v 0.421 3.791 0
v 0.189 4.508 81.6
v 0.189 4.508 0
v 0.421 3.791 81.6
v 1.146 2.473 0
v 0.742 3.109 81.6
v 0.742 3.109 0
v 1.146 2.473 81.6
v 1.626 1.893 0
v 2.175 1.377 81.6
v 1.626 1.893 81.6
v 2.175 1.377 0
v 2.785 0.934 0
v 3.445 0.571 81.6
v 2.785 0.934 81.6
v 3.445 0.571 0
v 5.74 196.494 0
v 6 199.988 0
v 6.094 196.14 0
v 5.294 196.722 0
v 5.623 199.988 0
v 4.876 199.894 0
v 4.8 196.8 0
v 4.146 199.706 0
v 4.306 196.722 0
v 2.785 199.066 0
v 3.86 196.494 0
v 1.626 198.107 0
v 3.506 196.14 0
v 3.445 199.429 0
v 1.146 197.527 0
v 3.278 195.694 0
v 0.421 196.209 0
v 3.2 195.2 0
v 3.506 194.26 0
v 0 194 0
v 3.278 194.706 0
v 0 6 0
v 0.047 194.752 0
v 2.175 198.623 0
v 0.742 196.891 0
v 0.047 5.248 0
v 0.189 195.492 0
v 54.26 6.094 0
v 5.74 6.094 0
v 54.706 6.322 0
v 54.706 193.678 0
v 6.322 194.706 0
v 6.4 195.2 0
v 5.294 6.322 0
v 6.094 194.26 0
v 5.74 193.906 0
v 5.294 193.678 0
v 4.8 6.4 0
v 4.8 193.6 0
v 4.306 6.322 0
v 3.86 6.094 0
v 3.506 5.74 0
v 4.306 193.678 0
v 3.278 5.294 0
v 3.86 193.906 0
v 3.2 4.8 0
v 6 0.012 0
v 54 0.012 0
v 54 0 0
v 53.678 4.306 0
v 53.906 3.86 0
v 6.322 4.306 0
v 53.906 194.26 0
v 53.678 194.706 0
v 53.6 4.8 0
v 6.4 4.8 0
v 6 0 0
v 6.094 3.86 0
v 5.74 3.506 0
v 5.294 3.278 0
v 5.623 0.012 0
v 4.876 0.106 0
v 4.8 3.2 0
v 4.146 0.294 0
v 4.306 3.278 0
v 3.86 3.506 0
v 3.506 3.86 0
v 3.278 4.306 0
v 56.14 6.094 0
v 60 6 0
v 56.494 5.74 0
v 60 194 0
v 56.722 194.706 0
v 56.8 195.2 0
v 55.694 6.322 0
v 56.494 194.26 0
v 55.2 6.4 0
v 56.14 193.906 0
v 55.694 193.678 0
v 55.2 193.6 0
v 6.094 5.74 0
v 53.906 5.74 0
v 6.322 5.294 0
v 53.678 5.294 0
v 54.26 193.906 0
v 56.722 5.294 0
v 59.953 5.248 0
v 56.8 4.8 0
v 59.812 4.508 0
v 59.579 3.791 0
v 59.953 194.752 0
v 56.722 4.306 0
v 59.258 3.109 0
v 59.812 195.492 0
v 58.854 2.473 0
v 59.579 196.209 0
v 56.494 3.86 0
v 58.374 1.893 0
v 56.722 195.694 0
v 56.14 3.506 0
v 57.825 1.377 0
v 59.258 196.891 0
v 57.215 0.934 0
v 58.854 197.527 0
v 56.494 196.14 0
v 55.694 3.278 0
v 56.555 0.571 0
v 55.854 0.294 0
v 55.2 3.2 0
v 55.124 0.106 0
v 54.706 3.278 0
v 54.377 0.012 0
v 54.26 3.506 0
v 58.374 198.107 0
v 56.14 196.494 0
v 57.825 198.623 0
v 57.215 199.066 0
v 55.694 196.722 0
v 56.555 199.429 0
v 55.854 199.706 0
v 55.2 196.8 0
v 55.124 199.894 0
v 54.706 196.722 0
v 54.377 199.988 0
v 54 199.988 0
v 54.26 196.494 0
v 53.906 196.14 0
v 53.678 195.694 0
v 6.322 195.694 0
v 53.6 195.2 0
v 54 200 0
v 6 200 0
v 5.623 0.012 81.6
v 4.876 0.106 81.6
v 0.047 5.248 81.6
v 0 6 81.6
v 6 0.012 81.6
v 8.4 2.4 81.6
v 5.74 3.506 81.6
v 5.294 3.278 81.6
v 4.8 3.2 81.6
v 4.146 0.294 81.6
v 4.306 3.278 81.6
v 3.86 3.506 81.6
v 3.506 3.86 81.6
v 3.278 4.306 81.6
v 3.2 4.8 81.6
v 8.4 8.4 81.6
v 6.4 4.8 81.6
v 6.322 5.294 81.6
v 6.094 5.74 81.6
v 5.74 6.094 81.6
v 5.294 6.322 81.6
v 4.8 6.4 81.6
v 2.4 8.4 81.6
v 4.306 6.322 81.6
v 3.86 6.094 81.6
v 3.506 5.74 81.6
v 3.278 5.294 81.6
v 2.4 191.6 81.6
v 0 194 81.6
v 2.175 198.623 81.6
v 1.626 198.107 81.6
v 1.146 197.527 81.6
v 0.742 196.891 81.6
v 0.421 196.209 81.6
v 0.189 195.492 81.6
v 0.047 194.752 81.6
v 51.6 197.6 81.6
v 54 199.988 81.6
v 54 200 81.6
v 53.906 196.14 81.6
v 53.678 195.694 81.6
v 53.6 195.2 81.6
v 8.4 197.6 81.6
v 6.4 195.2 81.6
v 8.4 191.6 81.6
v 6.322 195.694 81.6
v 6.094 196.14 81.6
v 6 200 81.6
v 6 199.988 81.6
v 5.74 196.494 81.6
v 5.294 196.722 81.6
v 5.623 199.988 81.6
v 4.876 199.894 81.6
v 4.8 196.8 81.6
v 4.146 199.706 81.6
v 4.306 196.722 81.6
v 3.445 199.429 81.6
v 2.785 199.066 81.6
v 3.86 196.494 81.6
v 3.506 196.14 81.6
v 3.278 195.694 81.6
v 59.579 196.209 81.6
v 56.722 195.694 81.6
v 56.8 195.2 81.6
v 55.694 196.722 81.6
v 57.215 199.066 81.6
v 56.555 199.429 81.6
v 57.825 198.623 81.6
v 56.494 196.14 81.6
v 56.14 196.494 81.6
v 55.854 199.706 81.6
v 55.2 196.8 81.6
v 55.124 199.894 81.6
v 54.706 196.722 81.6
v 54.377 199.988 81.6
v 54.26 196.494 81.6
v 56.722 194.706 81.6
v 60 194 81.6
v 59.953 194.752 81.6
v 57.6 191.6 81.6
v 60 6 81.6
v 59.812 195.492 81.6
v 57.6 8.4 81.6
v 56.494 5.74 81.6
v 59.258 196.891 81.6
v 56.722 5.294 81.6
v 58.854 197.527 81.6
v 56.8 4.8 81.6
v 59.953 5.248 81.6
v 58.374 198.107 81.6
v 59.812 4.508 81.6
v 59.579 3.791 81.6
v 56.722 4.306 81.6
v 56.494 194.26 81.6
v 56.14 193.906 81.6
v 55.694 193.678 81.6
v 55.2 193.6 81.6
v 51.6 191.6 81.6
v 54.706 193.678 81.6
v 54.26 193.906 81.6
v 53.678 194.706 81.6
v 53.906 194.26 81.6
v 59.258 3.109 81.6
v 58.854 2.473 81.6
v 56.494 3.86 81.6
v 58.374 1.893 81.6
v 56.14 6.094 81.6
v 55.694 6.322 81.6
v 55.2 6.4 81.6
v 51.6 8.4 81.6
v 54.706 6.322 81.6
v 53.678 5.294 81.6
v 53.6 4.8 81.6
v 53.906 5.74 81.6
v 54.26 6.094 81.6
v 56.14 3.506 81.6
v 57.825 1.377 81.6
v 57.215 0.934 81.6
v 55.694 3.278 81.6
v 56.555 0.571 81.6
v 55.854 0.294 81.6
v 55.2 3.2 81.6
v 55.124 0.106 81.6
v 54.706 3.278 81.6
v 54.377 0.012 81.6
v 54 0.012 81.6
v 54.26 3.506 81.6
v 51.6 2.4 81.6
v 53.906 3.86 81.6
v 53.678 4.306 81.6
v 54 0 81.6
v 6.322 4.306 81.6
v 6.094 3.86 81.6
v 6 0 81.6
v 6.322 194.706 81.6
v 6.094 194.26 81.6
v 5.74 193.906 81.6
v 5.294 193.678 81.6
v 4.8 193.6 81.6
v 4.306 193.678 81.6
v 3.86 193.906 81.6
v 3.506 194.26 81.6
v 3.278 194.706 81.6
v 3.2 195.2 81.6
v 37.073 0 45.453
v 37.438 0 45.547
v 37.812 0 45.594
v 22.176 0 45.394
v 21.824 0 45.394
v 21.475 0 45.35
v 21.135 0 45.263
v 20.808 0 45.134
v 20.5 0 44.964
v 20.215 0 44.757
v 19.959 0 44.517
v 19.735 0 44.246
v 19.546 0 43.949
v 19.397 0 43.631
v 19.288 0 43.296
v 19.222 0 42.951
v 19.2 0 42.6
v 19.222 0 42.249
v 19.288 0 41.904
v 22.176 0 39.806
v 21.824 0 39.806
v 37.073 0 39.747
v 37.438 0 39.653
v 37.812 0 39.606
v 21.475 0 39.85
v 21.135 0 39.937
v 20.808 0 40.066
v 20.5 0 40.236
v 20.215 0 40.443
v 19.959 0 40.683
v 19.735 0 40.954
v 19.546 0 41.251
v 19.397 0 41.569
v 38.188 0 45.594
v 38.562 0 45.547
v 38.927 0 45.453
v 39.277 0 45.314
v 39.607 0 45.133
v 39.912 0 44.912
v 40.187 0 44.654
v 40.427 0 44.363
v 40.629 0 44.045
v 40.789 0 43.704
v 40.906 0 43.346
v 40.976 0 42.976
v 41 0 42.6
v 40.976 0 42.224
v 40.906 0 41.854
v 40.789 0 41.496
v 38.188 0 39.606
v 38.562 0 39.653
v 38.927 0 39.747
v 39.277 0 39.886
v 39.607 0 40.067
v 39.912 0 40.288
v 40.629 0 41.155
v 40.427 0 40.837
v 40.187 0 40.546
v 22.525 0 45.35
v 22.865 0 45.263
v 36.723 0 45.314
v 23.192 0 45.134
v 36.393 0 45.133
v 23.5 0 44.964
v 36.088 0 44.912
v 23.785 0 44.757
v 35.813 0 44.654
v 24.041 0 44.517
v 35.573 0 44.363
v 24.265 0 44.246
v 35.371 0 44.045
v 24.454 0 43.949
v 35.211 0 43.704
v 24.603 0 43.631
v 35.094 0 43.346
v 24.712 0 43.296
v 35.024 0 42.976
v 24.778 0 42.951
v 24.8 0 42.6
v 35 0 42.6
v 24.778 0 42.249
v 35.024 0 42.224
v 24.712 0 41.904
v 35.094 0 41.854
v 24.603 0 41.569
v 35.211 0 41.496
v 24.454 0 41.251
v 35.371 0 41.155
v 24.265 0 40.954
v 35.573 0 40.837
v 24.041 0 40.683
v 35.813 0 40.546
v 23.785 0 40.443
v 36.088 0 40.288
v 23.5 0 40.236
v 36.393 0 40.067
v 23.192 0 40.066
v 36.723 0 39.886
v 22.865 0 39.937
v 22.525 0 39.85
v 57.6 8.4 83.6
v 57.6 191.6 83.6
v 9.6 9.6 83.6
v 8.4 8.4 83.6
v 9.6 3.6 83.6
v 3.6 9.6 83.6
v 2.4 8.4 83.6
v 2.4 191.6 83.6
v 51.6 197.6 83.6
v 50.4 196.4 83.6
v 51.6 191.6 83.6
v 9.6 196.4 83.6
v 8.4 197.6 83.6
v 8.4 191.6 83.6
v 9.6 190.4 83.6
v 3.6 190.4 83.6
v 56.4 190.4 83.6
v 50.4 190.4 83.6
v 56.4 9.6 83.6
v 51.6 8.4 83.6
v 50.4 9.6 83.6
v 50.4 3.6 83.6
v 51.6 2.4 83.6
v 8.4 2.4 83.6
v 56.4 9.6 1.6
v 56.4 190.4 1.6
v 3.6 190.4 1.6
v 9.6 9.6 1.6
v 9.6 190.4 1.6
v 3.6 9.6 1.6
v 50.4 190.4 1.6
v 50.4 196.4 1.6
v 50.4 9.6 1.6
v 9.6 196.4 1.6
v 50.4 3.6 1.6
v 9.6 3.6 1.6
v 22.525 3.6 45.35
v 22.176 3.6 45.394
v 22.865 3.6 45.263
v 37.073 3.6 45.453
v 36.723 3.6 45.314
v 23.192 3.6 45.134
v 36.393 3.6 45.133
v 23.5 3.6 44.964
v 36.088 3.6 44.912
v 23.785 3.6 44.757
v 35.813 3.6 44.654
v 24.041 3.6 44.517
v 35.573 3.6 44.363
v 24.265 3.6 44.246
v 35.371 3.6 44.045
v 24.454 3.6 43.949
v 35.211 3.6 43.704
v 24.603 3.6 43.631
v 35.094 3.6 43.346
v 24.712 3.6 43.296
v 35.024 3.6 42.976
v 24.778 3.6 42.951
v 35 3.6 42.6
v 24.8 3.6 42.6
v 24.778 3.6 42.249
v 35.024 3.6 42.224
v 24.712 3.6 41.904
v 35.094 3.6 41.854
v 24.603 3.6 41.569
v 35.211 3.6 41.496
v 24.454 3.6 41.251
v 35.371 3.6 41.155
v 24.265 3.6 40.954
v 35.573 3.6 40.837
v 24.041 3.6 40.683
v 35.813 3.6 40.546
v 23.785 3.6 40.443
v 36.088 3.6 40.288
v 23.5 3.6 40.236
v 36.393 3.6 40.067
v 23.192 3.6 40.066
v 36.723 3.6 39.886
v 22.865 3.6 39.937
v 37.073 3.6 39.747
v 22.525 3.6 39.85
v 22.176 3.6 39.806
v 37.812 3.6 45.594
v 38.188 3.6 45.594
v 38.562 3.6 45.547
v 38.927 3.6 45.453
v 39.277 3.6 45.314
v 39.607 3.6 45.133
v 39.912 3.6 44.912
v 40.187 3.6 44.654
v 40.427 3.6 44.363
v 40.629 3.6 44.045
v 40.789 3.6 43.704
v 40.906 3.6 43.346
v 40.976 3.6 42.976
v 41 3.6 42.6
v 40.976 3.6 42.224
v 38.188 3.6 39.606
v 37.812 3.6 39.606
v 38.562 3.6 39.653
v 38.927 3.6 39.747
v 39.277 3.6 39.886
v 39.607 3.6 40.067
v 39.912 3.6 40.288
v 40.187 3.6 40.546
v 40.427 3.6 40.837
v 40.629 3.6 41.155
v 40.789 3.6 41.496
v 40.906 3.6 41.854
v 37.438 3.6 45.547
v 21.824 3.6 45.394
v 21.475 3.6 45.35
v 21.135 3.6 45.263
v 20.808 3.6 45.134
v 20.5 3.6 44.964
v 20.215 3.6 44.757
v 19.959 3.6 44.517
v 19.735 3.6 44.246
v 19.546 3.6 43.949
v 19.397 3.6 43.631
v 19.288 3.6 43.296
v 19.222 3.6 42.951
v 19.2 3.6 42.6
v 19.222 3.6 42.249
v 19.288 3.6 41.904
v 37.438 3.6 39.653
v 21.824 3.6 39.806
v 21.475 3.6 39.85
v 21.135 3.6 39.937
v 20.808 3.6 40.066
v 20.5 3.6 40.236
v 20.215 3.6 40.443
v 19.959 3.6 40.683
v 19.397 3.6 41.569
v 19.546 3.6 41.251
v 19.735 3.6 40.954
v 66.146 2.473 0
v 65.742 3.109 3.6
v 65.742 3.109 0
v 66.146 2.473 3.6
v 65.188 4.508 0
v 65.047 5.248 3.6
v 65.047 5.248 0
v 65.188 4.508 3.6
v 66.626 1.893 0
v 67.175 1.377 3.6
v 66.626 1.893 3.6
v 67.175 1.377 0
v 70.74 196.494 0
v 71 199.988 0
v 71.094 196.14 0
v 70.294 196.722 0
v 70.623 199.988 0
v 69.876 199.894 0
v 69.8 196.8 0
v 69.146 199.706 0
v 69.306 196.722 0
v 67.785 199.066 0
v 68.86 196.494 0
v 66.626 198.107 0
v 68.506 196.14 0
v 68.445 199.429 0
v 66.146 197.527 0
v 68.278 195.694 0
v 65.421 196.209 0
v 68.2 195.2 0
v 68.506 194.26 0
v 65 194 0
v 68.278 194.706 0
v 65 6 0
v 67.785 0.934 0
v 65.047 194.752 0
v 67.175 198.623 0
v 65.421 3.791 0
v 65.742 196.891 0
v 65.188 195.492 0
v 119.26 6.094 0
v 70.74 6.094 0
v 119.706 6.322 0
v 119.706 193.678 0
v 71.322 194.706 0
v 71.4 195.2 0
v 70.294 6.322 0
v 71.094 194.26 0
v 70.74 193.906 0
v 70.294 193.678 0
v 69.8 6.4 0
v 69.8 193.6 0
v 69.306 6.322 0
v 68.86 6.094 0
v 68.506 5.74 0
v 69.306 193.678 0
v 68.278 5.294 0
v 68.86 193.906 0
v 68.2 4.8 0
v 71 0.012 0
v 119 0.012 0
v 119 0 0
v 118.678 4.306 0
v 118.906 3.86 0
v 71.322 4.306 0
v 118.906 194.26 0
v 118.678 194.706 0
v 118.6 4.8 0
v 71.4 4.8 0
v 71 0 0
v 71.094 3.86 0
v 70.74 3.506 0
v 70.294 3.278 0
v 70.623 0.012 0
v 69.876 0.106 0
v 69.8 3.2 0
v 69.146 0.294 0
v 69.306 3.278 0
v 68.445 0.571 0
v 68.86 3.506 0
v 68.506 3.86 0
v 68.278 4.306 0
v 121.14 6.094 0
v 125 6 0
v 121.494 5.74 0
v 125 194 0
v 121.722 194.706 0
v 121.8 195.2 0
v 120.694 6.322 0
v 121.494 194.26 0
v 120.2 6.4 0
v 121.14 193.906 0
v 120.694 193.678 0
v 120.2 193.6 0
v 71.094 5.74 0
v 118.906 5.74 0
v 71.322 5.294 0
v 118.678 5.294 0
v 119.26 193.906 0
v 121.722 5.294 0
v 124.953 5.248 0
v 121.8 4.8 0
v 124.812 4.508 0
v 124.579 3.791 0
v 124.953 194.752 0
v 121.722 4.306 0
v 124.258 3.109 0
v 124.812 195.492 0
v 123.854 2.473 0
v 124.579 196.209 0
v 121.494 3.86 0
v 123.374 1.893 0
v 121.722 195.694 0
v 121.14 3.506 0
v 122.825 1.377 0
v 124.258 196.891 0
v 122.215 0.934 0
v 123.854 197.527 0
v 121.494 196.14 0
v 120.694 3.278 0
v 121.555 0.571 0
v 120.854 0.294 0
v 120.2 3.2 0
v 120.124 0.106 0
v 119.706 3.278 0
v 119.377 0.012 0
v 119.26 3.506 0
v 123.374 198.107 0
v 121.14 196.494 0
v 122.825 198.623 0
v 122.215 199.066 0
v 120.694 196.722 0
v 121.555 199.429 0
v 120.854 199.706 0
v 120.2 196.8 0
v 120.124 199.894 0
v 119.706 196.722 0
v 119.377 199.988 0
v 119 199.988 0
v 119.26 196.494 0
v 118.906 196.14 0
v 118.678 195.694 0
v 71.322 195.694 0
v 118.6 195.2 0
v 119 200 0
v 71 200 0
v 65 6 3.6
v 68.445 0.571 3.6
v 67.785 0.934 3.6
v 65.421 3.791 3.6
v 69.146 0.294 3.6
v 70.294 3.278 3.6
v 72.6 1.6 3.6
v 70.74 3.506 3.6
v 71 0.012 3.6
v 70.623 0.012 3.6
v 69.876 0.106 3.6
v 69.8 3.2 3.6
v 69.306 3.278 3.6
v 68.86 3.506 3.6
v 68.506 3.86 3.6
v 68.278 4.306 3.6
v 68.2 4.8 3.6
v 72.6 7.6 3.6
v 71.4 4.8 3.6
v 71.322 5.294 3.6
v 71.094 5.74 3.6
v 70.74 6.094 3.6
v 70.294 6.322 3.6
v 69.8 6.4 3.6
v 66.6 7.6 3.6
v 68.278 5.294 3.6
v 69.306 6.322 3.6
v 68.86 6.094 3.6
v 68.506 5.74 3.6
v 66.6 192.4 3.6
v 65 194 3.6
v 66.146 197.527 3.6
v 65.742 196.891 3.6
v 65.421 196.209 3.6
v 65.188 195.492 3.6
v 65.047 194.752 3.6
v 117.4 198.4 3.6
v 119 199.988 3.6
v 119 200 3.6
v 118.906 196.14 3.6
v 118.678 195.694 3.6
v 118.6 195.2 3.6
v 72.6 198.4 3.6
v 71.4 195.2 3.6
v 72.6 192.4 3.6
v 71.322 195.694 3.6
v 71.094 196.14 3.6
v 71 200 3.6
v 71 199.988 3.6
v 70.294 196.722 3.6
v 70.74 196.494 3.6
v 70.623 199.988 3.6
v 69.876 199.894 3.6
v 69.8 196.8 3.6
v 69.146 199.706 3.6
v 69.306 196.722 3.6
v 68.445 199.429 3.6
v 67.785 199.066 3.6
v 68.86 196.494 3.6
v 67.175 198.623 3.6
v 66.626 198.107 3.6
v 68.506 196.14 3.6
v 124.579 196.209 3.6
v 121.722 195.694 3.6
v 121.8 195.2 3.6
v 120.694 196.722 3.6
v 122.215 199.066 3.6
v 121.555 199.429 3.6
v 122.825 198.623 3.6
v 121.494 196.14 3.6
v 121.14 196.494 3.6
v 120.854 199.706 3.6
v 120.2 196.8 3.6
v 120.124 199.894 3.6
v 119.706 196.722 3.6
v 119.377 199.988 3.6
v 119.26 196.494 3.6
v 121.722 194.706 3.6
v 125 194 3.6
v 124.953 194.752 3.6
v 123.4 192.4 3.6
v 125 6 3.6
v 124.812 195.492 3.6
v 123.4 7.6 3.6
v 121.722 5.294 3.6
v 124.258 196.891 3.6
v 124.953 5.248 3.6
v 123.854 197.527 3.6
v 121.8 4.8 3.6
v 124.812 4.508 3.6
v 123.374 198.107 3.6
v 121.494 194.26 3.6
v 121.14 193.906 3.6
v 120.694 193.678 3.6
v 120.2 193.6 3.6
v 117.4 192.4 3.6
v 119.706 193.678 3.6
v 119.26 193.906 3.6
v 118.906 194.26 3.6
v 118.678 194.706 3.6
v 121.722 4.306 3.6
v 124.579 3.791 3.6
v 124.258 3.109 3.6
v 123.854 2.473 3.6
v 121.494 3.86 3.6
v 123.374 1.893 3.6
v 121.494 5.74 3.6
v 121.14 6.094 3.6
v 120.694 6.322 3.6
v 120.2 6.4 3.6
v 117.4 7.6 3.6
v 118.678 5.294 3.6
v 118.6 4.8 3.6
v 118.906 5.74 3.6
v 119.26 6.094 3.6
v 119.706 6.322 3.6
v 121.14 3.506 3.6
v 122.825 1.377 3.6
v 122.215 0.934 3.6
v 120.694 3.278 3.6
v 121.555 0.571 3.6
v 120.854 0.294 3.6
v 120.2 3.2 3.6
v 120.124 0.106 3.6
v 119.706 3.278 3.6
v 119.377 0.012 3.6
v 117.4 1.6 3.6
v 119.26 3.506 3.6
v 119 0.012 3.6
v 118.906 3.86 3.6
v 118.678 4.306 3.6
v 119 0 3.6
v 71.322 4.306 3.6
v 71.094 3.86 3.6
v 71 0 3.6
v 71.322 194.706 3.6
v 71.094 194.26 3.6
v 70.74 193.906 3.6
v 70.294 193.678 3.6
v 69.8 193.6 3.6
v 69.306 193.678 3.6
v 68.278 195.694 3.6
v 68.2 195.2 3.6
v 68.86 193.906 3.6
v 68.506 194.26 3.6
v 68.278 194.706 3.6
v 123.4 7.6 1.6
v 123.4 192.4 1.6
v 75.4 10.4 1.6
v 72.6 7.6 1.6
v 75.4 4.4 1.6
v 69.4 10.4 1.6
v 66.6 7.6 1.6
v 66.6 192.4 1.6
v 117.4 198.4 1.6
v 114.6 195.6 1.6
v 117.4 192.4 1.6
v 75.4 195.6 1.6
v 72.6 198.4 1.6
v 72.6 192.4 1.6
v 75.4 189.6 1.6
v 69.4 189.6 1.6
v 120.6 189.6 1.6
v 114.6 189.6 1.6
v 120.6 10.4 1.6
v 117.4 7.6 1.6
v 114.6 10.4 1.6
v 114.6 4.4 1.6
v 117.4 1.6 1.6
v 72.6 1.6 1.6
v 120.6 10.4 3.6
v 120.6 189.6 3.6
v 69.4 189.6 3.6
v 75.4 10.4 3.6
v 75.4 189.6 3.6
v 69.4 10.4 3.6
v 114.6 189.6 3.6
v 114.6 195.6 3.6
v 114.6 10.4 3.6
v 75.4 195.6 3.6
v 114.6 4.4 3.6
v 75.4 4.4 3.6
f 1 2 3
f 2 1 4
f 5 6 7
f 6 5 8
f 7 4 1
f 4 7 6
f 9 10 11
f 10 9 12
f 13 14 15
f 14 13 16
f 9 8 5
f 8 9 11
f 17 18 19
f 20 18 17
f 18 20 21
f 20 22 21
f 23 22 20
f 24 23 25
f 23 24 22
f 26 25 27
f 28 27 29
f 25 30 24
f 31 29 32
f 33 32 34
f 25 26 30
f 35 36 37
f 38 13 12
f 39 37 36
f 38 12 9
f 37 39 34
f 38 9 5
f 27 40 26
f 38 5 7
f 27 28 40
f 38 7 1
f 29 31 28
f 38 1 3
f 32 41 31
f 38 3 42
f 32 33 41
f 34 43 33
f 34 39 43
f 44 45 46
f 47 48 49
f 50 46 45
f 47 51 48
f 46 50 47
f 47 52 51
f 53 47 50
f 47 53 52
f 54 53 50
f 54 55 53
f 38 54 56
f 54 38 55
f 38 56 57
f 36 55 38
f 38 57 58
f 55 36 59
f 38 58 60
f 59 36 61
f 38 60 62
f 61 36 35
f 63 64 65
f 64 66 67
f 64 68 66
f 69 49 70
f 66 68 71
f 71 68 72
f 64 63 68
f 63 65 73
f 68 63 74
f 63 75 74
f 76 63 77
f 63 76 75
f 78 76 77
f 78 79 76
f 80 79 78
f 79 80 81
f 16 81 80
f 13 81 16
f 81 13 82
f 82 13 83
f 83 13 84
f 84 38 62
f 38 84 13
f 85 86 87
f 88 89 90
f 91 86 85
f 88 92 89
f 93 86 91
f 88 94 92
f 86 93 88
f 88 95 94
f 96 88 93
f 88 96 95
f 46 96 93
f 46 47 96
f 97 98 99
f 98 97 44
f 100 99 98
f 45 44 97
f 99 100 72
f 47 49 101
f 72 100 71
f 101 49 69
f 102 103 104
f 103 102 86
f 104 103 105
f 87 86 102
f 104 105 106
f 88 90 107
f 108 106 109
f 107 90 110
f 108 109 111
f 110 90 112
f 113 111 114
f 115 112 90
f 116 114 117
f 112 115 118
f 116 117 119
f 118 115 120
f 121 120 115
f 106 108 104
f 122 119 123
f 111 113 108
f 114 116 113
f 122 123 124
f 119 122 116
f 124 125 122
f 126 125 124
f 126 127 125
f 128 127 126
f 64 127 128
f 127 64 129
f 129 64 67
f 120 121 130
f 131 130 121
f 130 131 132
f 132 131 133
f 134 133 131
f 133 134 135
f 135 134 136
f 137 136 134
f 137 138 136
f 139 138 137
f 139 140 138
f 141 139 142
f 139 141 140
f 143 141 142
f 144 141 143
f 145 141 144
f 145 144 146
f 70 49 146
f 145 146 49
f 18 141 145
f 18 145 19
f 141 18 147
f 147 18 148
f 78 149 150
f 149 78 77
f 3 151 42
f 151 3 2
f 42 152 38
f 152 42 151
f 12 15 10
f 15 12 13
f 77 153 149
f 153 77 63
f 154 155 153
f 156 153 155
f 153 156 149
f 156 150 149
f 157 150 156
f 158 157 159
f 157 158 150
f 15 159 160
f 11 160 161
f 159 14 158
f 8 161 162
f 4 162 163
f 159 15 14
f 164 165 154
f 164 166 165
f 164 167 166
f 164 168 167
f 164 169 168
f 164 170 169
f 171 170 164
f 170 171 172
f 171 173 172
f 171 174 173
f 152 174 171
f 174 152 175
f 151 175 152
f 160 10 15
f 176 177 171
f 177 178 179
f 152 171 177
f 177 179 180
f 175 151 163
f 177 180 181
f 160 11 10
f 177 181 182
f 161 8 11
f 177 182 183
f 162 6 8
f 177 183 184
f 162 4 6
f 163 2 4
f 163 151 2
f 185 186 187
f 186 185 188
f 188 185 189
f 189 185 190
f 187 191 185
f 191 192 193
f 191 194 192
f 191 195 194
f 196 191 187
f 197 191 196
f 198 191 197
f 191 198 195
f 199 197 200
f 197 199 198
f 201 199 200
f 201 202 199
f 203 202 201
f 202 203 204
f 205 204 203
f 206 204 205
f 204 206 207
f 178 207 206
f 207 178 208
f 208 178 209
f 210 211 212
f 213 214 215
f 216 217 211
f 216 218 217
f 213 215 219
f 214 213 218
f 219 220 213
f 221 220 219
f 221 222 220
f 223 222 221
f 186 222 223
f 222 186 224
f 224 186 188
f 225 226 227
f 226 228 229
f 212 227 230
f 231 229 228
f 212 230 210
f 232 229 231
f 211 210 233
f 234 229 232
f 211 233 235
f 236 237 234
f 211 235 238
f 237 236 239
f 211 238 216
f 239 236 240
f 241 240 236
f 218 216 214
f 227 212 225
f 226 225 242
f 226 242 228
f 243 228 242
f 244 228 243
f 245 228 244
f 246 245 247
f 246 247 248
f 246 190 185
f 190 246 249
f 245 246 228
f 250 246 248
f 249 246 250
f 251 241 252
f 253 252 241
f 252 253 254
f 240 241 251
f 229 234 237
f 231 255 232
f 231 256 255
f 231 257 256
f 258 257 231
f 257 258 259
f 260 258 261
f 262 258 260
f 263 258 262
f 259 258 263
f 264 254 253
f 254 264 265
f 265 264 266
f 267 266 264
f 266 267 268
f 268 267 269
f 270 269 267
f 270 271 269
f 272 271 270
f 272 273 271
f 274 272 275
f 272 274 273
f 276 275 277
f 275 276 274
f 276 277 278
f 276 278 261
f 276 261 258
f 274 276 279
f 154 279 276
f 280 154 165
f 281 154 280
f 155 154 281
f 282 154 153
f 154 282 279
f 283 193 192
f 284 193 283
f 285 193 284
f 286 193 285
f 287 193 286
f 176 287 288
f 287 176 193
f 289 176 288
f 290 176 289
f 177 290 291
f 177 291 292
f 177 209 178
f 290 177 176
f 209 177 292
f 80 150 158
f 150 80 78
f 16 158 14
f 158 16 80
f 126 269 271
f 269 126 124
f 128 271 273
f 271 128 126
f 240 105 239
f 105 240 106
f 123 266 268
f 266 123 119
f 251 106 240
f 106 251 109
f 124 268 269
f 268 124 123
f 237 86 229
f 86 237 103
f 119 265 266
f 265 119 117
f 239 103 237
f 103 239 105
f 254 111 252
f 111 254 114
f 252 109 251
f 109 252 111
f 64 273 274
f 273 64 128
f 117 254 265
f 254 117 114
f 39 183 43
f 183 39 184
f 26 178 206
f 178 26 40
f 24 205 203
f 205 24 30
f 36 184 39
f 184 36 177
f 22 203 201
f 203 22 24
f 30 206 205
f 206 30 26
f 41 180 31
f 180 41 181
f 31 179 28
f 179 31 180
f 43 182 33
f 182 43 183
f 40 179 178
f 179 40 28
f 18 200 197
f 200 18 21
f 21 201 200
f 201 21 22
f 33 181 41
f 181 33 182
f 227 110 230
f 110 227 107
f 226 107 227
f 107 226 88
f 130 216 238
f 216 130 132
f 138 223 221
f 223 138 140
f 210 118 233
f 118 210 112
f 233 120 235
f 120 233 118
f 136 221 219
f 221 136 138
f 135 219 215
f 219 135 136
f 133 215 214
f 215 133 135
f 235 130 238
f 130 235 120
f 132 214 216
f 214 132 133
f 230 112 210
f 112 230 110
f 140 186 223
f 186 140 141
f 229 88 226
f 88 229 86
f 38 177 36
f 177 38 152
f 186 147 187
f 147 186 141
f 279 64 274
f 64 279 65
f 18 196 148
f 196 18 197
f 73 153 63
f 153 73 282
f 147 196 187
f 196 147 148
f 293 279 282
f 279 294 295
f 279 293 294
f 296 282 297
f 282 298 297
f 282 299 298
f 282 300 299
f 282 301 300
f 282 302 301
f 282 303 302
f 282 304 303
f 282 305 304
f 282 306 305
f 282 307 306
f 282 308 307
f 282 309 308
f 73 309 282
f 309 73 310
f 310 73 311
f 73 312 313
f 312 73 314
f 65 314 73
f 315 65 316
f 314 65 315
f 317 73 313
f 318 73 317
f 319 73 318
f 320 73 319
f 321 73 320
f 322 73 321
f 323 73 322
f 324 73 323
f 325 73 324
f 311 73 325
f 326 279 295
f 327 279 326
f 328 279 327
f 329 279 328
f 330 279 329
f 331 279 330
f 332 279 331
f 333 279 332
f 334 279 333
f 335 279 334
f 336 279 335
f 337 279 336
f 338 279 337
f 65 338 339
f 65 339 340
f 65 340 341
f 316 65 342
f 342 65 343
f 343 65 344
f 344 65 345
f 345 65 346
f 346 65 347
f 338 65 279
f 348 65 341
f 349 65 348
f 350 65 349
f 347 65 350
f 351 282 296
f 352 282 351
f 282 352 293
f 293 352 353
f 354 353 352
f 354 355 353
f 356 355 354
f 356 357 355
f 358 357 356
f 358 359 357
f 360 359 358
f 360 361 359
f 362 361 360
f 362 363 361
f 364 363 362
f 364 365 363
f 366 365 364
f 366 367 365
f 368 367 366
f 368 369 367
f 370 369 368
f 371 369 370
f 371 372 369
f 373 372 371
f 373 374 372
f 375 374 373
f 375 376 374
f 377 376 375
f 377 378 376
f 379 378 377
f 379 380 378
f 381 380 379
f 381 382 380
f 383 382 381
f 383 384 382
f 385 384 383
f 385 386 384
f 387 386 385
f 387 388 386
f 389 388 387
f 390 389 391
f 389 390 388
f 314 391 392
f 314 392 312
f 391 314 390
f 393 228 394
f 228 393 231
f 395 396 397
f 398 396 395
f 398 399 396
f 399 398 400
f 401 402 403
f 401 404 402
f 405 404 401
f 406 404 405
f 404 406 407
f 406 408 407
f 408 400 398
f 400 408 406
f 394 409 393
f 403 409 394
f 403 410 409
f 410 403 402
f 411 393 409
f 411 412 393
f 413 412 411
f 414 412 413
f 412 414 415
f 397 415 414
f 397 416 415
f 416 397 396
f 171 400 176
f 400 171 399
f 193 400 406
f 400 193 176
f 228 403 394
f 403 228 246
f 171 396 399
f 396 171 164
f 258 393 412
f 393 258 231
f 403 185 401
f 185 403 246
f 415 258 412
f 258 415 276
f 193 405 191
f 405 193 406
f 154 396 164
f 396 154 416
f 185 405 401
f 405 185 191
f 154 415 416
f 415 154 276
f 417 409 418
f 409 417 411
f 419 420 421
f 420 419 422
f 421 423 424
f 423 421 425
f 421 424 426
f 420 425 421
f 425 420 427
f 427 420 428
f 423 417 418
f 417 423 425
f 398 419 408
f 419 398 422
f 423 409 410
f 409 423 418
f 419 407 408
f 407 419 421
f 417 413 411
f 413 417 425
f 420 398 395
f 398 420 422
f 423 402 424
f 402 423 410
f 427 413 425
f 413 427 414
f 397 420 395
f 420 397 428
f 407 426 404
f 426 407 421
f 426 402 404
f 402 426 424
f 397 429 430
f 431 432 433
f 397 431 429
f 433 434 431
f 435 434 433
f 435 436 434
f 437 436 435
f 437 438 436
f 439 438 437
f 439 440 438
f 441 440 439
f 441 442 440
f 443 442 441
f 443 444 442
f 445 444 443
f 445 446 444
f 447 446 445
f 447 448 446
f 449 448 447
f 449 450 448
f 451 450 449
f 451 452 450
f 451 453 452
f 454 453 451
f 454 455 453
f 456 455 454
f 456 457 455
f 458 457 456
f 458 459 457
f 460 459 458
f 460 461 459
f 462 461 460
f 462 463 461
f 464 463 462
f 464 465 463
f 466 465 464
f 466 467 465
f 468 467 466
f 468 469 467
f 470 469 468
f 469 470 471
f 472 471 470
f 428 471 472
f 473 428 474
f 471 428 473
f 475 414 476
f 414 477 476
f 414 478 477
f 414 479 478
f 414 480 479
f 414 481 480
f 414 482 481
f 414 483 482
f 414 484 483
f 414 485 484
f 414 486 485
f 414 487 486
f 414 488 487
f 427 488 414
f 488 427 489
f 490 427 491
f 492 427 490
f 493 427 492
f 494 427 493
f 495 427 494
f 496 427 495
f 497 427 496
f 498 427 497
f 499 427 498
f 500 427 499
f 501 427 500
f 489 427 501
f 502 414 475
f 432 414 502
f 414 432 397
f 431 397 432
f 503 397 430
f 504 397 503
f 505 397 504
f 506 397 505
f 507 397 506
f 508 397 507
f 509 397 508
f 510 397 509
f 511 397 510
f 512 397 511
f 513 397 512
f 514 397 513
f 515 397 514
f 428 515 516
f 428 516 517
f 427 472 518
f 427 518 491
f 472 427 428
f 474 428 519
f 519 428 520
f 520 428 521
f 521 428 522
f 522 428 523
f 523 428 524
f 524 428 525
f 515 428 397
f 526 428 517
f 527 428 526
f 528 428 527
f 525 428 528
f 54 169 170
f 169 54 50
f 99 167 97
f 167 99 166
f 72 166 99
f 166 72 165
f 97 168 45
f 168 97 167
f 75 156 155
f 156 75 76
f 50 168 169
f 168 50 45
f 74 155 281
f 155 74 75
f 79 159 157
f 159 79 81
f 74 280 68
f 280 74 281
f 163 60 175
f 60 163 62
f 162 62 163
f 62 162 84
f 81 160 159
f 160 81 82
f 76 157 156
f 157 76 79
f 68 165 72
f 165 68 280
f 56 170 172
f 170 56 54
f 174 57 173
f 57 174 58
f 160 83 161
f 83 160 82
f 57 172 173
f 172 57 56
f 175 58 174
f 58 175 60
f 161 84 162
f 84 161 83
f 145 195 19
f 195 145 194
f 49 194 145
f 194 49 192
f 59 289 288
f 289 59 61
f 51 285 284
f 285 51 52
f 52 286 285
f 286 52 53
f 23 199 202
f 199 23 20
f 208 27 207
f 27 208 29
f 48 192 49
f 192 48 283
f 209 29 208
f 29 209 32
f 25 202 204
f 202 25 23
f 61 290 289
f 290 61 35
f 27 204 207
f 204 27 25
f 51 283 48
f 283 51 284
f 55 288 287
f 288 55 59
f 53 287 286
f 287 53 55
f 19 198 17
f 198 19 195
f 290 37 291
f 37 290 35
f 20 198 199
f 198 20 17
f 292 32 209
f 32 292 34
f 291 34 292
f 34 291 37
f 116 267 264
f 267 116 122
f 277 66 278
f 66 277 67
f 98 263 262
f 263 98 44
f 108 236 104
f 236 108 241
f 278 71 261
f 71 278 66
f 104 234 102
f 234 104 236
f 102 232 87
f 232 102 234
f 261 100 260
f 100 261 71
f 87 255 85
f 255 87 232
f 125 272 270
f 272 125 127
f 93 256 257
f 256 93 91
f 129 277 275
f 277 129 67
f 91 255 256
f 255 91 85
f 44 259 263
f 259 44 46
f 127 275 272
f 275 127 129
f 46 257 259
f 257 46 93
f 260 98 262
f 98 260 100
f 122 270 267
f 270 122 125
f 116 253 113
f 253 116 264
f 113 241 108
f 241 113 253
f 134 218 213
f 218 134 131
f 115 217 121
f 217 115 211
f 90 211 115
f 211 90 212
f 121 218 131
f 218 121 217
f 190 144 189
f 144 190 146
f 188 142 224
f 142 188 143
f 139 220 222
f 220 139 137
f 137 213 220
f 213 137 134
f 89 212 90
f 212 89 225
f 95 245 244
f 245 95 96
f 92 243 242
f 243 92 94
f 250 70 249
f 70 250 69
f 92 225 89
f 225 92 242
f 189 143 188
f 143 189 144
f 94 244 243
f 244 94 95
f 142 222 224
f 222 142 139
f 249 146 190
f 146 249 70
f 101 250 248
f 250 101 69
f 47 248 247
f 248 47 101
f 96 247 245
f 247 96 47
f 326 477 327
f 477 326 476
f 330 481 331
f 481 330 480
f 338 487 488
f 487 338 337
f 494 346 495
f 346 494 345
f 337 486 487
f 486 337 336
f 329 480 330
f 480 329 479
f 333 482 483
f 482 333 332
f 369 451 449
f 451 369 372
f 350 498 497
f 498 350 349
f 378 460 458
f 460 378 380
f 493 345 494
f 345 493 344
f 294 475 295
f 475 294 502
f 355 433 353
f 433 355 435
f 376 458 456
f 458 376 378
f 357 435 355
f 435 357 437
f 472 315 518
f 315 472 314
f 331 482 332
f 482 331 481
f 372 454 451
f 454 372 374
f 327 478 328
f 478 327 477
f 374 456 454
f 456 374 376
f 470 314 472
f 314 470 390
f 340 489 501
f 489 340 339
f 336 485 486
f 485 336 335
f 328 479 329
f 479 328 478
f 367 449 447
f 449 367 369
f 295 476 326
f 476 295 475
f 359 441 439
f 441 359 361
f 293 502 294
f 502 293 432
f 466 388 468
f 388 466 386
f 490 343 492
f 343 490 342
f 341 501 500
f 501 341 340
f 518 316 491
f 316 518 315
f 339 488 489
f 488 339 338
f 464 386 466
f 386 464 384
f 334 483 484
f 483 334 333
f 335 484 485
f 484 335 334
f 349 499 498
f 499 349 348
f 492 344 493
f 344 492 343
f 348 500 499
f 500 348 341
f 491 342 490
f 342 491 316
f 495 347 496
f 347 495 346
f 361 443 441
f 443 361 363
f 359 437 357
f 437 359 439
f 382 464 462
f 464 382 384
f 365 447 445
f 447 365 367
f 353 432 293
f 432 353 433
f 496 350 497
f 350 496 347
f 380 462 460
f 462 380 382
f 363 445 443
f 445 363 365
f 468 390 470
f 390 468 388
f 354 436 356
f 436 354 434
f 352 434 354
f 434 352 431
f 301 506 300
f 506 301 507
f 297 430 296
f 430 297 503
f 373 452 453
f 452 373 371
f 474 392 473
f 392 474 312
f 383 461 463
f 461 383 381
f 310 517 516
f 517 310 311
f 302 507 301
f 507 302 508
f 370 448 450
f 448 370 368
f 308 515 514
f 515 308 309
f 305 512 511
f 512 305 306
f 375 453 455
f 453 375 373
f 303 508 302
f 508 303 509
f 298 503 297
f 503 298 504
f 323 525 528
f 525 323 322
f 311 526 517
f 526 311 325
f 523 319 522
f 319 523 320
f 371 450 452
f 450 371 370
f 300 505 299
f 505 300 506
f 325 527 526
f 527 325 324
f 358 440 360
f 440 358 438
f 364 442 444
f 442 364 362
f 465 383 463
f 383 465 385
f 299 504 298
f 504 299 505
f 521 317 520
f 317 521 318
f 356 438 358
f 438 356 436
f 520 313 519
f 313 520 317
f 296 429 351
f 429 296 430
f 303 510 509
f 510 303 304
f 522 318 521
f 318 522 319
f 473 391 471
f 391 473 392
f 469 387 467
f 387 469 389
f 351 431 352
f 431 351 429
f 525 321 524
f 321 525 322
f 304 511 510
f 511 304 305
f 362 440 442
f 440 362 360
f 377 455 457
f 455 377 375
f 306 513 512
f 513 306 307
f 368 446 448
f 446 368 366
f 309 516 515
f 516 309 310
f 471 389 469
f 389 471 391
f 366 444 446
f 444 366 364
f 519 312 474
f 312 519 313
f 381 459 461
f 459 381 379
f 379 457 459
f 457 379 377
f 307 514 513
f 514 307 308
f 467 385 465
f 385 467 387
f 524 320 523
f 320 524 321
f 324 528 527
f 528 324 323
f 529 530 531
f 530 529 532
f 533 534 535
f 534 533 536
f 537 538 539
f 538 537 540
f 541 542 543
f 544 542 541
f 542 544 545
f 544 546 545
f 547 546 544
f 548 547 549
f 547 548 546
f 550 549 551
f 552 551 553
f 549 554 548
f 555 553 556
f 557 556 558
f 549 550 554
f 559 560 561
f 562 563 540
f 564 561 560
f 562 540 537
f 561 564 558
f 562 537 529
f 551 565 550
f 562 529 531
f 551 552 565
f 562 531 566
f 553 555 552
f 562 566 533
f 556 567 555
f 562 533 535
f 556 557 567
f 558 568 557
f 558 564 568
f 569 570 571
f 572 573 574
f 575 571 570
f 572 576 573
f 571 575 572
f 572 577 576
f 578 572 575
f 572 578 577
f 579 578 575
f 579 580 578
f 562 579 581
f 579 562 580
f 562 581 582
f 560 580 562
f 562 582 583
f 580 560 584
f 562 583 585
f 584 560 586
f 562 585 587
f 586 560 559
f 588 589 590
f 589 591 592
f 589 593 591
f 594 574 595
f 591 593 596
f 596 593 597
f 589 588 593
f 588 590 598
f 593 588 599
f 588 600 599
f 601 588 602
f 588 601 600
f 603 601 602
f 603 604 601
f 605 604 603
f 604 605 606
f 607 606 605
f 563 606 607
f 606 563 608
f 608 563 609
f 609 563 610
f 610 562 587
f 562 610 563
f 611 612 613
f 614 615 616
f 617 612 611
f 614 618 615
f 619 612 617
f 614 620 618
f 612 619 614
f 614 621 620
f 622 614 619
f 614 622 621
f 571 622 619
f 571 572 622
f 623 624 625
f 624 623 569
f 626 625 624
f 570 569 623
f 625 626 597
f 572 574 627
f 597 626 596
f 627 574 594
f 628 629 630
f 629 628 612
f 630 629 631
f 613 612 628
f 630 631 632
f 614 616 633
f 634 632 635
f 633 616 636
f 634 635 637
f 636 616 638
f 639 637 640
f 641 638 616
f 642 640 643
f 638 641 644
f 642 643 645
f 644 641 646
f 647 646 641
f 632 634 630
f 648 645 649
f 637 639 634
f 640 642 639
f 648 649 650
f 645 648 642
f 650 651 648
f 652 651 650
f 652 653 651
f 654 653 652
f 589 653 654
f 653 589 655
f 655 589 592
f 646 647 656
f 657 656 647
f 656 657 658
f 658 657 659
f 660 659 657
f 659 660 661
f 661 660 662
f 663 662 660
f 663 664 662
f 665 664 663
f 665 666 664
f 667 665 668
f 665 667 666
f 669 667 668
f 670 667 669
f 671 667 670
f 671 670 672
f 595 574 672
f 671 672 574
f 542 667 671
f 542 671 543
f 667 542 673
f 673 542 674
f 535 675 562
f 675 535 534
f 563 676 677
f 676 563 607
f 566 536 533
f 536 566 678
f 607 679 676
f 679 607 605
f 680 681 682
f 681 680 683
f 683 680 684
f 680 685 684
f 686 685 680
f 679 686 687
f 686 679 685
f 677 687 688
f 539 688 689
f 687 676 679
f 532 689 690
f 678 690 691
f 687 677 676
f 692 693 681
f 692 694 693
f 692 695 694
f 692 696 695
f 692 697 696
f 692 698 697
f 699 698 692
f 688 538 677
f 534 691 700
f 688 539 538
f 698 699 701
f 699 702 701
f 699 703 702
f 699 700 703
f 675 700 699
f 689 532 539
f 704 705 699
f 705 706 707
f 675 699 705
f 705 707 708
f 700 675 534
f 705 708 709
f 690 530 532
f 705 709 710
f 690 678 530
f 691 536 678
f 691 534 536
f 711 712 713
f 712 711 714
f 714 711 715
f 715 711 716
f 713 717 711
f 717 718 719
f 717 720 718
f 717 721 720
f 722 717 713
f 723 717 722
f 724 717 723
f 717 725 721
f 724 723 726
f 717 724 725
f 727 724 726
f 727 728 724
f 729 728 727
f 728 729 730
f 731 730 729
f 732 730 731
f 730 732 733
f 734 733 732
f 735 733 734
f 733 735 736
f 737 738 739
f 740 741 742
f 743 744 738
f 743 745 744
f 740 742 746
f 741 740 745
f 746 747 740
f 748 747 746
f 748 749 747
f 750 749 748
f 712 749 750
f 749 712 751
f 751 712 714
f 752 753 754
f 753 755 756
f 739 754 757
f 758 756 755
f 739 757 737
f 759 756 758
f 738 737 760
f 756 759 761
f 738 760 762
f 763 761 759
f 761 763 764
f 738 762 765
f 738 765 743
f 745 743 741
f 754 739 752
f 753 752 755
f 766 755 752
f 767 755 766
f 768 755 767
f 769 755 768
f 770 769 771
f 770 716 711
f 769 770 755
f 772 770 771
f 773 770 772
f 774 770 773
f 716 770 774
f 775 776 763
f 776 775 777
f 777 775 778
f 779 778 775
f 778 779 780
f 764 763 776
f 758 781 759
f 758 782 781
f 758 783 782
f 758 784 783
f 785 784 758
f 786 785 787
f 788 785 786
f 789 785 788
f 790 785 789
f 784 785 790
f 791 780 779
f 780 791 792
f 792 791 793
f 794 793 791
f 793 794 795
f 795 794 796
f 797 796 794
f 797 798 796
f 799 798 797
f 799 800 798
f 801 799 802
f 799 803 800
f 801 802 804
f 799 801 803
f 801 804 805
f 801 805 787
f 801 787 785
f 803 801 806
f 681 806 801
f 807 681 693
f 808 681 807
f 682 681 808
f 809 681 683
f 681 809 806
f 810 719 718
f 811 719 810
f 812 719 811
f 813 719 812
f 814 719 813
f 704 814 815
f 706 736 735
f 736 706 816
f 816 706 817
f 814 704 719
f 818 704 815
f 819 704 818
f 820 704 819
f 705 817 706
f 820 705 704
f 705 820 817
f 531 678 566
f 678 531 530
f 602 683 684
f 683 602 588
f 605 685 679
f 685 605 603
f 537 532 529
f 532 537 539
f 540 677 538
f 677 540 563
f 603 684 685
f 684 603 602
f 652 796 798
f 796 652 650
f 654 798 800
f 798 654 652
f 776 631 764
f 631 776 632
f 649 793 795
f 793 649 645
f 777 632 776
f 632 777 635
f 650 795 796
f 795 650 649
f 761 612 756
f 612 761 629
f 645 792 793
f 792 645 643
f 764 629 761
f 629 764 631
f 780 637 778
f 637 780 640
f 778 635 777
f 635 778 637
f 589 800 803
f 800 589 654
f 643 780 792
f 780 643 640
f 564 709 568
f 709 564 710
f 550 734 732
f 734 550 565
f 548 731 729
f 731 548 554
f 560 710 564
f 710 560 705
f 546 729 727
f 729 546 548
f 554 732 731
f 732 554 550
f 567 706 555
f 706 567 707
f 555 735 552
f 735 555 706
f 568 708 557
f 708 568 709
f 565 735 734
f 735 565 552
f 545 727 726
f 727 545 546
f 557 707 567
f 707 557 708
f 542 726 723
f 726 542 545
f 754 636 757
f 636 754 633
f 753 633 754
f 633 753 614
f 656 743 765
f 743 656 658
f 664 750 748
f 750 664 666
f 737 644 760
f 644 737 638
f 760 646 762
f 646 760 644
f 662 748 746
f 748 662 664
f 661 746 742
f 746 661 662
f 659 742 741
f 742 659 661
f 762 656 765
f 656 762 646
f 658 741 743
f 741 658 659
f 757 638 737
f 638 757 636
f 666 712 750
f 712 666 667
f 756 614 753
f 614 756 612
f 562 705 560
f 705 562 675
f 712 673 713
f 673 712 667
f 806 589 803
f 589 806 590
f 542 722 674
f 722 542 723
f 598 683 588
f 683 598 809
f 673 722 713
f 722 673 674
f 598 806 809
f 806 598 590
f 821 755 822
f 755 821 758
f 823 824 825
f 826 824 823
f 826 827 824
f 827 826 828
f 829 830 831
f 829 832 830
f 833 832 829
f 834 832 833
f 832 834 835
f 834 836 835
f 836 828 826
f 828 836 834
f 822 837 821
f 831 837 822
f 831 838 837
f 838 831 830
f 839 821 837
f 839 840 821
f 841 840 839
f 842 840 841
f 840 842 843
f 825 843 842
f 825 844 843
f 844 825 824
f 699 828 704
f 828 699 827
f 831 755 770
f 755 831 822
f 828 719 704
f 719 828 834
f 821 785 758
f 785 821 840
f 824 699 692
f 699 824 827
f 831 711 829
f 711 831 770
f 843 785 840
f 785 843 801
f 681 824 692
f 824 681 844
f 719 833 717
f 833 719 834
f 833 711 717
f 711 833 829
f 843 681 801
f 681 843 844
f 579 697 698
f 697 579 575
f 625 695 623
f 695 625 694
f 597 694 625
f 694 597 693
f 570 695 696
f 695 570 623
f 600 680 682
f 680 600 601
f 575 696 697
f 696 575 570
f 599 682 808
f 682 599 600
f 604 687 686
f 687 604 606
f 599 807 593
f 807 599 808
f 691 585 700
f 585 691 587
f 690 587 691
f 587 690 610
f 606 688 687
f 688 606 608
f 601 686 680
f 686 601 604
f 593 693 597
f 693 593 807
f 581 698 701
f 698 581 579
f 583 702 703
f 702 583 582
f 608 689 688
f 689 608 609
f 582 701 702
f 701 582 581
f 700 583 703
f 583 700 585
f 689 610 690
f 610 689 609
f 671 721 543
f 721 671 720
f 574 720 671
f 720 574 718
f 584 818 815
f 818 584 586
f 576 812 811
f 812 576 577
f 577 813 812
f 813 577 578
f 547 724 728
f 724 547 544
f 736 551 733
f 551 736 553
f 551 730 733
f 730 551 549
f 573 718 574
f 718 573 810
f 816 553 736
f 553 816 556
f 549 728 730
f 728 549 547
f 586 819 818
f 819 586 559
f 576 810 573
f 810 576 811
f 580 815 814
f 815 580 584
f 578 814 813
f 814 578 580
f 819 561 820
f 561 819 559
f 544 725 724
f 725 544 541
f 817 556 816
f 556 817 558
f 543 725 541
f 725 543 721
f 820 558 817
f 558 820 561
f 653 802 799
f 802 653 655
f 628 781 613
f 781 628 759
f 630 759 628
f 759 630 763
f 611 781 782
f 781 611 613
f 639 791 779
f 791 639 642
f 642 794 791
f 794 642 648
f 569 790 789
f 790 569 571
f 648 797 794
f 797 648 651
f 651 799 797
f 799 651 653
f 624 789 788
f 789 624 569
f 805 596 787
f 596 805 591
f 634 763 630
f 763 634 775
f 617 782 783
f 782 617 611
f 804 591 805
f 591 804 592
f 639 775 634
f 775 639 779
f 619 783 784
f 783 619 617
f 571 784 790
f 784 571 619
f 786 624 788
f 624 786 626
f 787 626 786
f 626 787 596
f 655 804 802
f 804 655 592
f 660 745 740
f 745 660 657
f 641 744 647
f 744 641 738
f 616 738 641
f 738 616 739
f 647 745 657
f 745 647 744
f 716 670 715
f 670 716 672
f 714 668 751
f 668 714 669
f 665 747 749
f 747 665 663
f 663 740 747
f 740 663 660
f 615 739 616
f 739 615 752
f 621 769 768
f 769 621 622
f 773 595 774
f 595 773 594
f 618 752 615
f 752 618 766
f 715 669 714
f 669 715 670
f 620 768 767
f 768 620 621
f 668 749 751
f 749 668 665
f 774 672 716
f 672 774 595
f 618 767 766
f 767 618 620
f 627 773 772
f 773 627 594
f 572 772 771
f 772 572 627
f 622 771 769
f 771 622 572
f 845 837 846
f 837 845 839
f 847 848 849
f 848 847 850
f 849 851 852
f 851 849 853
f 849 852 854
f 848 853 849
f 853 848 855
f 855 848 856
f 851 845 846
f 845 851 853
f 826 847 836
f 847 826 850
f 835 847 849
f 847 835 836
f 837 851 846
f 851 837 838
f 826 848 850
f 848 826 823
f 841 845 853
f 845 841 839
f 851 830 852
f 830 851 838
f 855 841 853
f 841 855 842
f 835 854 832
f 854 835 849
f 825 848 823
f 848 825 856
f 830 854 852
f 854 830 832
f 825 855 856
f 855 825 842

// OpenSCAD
box_wp();

module box_wp(
/* [Box Options] */
// Dimension: Box outer X-Size [mm]
box_Size_X          = 60,
// Dimension: Box outer Y-Size [mm]
box_Size_Y          = 200,
// Dimension: Box Inner height [mm]
box_Inner_Height    = 80,
// Box bottom/top thickness
box_BottomTop_Thickness =  1.6, // [0.6:0.2:3]
// Edge corner radius 
box_Screw_Corner_Radius   =  6, // [2:1:10]
// four outer screw hole diameters
box_Screw_Diameter     =  3.2,// [2:0.2:4]
// Box wall thickness
box_Wall_Thickness     =  3.6, // [0.4:0.2:3.2]
/* [Top Barrier Options] */
// Box barrier thickness
barrier_Thickness  =  1.2, // [0.4:0.2:3.2]
// Box barrier height
barrier_Height     =  2,   // [1.0:0.2:8]
// Additional width on the lid to correct for badly calibrated printers
barrier_Tolerance  =  0.8, // [0.0:0.1:1]
/* [Mouting Screw Nose Options] */
// Number of screw noses
screwnose_Number        = 0, // [0:No noses, 2: one top/one bottom, 4: two top/two bottom]
// Diameter of the noses' screw holes
screwnose_Diameter      = 4, // [2:0.2:8]
// Height of the noses
screwnose_Height        = 5, // [2:0.2:10]
// Wall thickness
screwnose_Wall_Thickness = 2.8, // [2:0.2:5]
outbox =1,
outlid=1// 
) {
	
	
if (outbox) box();
	if(outlid)
if (box_Size_X>box_Size_Y) {
	translate([0, box_Size_Y+5+screwnose_Diameter+screwnose_Wall_Thickness, 0]) lid();	
} else {
	translate([box_Size_X+5, 0, 0]) lid();	
}



// **************************
// ** Calculated globals
// **************************
boxHeight = box_Inner_Height+box_BottomTop_Thickness;

module box() {
	barrier_Thickness = box_Wall_Thickness-barrier_Thickness;
	difference() {
		union() {
			// solid round box, corners
			translate([box_Screw_Corner_Radius, box_Screw_Corner_Radius, 0]) cylinder(r=box_Screw_Corner_Radius, h=boxHeight, $fn=50); // bottom left
			translate([box_Size_X-box_Screw_Corner_Radius, box_Screw_Corner_Radius, 0]) cylinder(r=box_Screw_Corner_Radius, h=boxHeight, $fn=50); // bottom right
			translate([box_Screw_Corner_Radius, box_Size_Y-box_Screw_Corner_Radius, 0]) cylinder(r=box_Screw_Corner_Radius, h=boxHeight, $fn=50); // top left
			translate([box_Size_X-box_Screw_Corner_Radius, box_Size_Y-box_Screw_Corner_Radius, 0]) cylinder(r=box_Screw_Corner_Radius, h=boxHeight, $fn=50); // bottom right
			// solid round box, inner filling
			translate([0, box_Screw_Corner_Radius, 0]) cube([box_Size_X, box_Size_Y-2*box_Screw_Corner_Radius, boxHeight]);
			translate([box_Screw_Corner_Radius, 0, 0]) cube([box_Size_X-2*box_Screw_Corner_Radius, box_Size_Y, boxHeight]);
			// solid round box, top border
			translate([barrier_Thickness, box_Screw_Corner_Radius+barrier_Thickness, 0]) cube([box_Size_X-2*barrier_Thickness, box_Size_Y-2*box_Screw_Corner_Radius-2*barrier_Thickness, boxHeight+barrier_Height]);
			translate([box_Screw_Corner_Radius+barrier_Thickness, barrier_Thickness, 0]) cube([box_Size_X-2*box_Screw_Corner_Radius-2*barrier_Thickness, box_Size_Y-2*barrier_Thickness, boxHeight+barrier_Height]);
		}
		// inner cut-out
		translate([box_Wall_Thickness, box_Screw_Corner_Radius+box_Wall_Thickness, box_BottomTop_Thickness]) cube([box_Size_X-2*box_Wall_Thickness, box_Size_Y-2*box_Screw_Corner_Radius-2*box_Wall_Thickness, boxHeight+barrier_Height]);
		translate([box_Screw_Corner_Radius+box_Wall_Thickness, box_Wall_Thickness, box_BottomTop_Thickness]) cube([box_Size_X-2*box_Screw_Corner_Radius-2*box_Wall_Thickness, box_Size_Y-2*box_Wall_Thickness, boxHeight+barrier_Height]);
		// Screw holes
		translate([(box_Screw_Corner_Radius+box_Wall_Thickness)/2,(box_Screw_Corner_Radius+box_Wall_Thickness)/2,0]) cylinder(r=box_Screw_Diameter/2, h=boxHeight, $fn=20);
		translate([(box_Screw_Corner_Radius+box_Wall_Thickness)/2,box_Size_Y-(box_Screw_Corner_Radius+box_Wall_Thickness)/2,0]) cylinder(r=box_Screw_Diameter/2, h=boxHeight, $fn=20);
		translate([box_Size_X-(box_Screw_Corner_Radius+box_Wall_Thickness)/2,(box_Screw_Corner_Radius+box_Wall_Thickness)/2,0]) cylinder(r=box_Screw_Diameter/2, h=boxHeight, $fn=20);
		translate([box_Size_X-(box_Screw_Corner_Radius+box_Wall_Thickness)/2,box_Size_Y-(box_Screw_Corner_Radius+box_Wall_Thickness)/2,0]) cylinder(r=box_Screw_Diameter/2, h=boxHeight, $fn=20);
		// **************************
		// ** YOUR OWN CUTOUTS HERE!
		// **************************
		cRadius = 2.8;
		translate([box_Size_X/2+8,(box_Wall_Thickness+0.1), box_Wall_Thickness+((boxHeight-box_Wall_Thickness)/2)]) rotate([90,00,0]) cylinder(r=cRadius2, h=box_Wall_Thickness+0.2,$fn=50);
		cRadius2 = 3.0;
		translate([box_Size_X/2-8,(box_Wall_Thickness+0.1), box_Wall_Thickness+((boxHeight-box_Wall_Thickness)/2)]) rotate([90,00,0]) cylinder(r=cRadius, h=box_Wall_Thickness+0.2,$fn=50);
		// **************************
		// ** / CUTOUTS
		// **************************
	}
	// Lower nose(s)
	if (screwnose_Number==2) translate([box_Size_X/2, 0.001, 0]) mirror([0,1,0]) screwNose(screwnose_Diameter, screwnose_Height);
	if (screwnose_Number==4) {
		translate([box_Size_X*0.25, 0.001, 0]) mirror([0,1,0]) screwNose(screwnose_Diameter, screwnose_Height);
		translate([box_Size_X*0.75, 0.001, 0]) mirror([0,1,0]) screwNose(screwnose_Diameter, screwnose_Height);
	}
	// Upper nose(s)
	if (screwnose_Number==2) translate([box_Size_X/2, box_Size_Y-0.001, 0]) screwNose(screwnose_Diameter, screwnose_Height);
	if (screwnose_Number==4) {
		translate([box_Size_X*0.25, box_Size_Y-0.001, 0]) screwNose(screwnose_Diameter, screwnose_Height);
		translate([box_Size_X*0.75, box_Size_Y-0.001, 0]) screwNose(screwnose_Diameter, screwnose_Height);
	}
}

module lid() {
	boxHeight = box_BottomTop_Thickness+barrier_Height;
	difference() {
		union() {
			// solid round box, corners
			translate([box_Screw_Corner_Radius, box_Screw_Corner_Radius, 0]) cylinder(r=box_Screw_Corner_Radius, h=boxHeight, $fn=50); // bottom left
			translate([box_Size_X-box_Screw_Corner_Radius, box_Screw_Corner_Radius, 0]) cylinder(r=box_Screw_Corner_Radius, h=boxHeight, $fn=50); // bottom right
			translate([box_Screw_Corner_Radius, box_Size_Y-box_Screw_Corner_Radius, 0]) cylinder(r=box_Screw_Corner_Radius, h=boxHeight, $fn=50); // top left
			translate([box_Size_X-box_Screw_Corner_Radius, box_Size_Y-box_Screw_Corner_Radius, 0]) cylinder(r=box_Screw_Corner_Radius, h=boxHeight, $fn=50); // bottom right
			// solid round box, inner filling
			translate([0, box_Screw_Corner_Radius, 0]) cube([box_Size_X, box_Size_Y-2*box_Screw_Corner_Radius, boxHeight]);
			translate([box_Screw_Corner_Radius, 0, 0]) cube([box_Size_X-2*box_Screw_Corner_Radius, box_Size_Y, boxHeight]);
			// solid round box, top border
		}
		// inner cut-out X direction
		translate([
			box_Wall_Thickness-(barrier_Thickness+barrier_Tolerance),
			box_Screw_Corner_Radius+box_Wall_Thickness-(barrier_Thickness+barrier_Tolerance),
			box_BottomTop_Thickness
		]) cube([
			box_Size_X-2*(box_Wall_Thickness)+2*(barrier_Thickness+barrier_Tolerance),
			box_Size_Y-2*box_Screw_Corner_Radius-2*(box_Wall_Thickness)+2*(barrier_Thickness+barrier_Tolerance),
			box_BottomTop_Thickness+barrier_Height
		]);
		// inner cut-out Y direction
		translate([
			box_Screw_Corner_Radius+box_Wall_Thickness-(barrier_Thickness+barrier_Tolerance),
			box_Wall_Thickness-(barrier_Thickness+barrier_Tolerance),
			box_BottomTop_Thickness
		]) cube([
			box_Size_X-2*box_Screw_Corner_Radius-2*(box_Wall_Thickness)+2*(barrier_Thickness+barrier_Tolerance),
			box_Size_Y-2*(box_Wall_Thickness)+2*(barrier_Thickness+barrier_Tolerance),
			box_BottomTop_Thickness+barrier_Height
		]);
		
		// Screw holes
		translate([(box_Screw_Corner_Radius+box_Wall_Thickness)/2,(box_Screw_Corner_Radius+box_Wall_Thickness)/2,0]) cylinder(r=box_Screw_Diameter/2, h=boxHeight, $fn=20);
		translate([(box_Screw_Corner_Radius+box_Wall_Thickness)/2,box_Size_Y-(box_Screw_Corner_Radius+box_Wall_Thickness)/2,0]) cylinder(r=box_Screw_Diameter/2, h=boxHeight, $fn=20);
		translate([box_Size_X-(box_Screw_Corner_Radius+box_Wall_Thickness)/2,(box_Screw_Corner_Radius+box_Wall_Thickness)/2,0]) cylinder(r=box_Screw_Diameter/2, h=boxHeight, $fn=20);
		translate([box_Size_X-(box_Screw_Corner_Radius+box_Wall_Thickness)/2,box_Size_Y-(box_Screw_Corner_Radius+box_Wall_Thickness)/2,0]) cylinder(r=box_Screw_Diameter/2, h=boxHeight, $fn=20);
	}

	// inner add X direction
	translate([box_Wall_Thickness+barrier_Tolerance, box_Screw_Corner_Radius+box_Wall_Thickness+barrier_Tolerance, box_BottomTop_Thickness])
		cube([box_Size_X-2*(box_Wall_Thickness+barrier_Tolerance), box_Size_Y-2*(box_Screw_Corner_Radius+box_Wall_Thickness+barrier_Tolerance), barrier_Height]);
	// inner add Y direction
	translate([box_Screw_Corner_Radius+box_Wall_Thickness+barrier_Tolerance, box_Wall_Thickness+barrier_Tolerance, box_BottomTop_Thickness])
		cube([box_Size_X-2*(box_Screw_Corner_Radius+box_Wall_Thickness+barrier_Tolerance), box_Size_Y-2*(box_Wall_Thickness+barrier_Tolerance), barrier_Height]);
}

module screwNose(screwholeDiameter=4, noseHeight=5) {
	additionalDistanceFromWall = 1;
	translate([0,screwholeDiameter/2+screwnose_Wall_Thickness+additionalDistanceFromWall, 0]) difference() {
		union() {
			translate([-(screwholeDiameter/2+screwnose_Wall_Thickness), -(screwholeDiameter/2+screwnose_Wall_Thickness+additionalDistanceFromWall),0]) cube([(screwholeDiameter/2+screwnose_Wall_Thickness)*2, screwholeDiameter/2+screwnose_Wall_Thickness+additionalDistanceFromWall, noseHeight]);
			cylinder(r=(screwholeDiameter/2)+screwnose_Wall_Thickness, h=noseHeight, $fn=60);
		}
		cylinder(r=screwholeDiameter/2, h=noseHeight, $fn=60);
	}
}
}
